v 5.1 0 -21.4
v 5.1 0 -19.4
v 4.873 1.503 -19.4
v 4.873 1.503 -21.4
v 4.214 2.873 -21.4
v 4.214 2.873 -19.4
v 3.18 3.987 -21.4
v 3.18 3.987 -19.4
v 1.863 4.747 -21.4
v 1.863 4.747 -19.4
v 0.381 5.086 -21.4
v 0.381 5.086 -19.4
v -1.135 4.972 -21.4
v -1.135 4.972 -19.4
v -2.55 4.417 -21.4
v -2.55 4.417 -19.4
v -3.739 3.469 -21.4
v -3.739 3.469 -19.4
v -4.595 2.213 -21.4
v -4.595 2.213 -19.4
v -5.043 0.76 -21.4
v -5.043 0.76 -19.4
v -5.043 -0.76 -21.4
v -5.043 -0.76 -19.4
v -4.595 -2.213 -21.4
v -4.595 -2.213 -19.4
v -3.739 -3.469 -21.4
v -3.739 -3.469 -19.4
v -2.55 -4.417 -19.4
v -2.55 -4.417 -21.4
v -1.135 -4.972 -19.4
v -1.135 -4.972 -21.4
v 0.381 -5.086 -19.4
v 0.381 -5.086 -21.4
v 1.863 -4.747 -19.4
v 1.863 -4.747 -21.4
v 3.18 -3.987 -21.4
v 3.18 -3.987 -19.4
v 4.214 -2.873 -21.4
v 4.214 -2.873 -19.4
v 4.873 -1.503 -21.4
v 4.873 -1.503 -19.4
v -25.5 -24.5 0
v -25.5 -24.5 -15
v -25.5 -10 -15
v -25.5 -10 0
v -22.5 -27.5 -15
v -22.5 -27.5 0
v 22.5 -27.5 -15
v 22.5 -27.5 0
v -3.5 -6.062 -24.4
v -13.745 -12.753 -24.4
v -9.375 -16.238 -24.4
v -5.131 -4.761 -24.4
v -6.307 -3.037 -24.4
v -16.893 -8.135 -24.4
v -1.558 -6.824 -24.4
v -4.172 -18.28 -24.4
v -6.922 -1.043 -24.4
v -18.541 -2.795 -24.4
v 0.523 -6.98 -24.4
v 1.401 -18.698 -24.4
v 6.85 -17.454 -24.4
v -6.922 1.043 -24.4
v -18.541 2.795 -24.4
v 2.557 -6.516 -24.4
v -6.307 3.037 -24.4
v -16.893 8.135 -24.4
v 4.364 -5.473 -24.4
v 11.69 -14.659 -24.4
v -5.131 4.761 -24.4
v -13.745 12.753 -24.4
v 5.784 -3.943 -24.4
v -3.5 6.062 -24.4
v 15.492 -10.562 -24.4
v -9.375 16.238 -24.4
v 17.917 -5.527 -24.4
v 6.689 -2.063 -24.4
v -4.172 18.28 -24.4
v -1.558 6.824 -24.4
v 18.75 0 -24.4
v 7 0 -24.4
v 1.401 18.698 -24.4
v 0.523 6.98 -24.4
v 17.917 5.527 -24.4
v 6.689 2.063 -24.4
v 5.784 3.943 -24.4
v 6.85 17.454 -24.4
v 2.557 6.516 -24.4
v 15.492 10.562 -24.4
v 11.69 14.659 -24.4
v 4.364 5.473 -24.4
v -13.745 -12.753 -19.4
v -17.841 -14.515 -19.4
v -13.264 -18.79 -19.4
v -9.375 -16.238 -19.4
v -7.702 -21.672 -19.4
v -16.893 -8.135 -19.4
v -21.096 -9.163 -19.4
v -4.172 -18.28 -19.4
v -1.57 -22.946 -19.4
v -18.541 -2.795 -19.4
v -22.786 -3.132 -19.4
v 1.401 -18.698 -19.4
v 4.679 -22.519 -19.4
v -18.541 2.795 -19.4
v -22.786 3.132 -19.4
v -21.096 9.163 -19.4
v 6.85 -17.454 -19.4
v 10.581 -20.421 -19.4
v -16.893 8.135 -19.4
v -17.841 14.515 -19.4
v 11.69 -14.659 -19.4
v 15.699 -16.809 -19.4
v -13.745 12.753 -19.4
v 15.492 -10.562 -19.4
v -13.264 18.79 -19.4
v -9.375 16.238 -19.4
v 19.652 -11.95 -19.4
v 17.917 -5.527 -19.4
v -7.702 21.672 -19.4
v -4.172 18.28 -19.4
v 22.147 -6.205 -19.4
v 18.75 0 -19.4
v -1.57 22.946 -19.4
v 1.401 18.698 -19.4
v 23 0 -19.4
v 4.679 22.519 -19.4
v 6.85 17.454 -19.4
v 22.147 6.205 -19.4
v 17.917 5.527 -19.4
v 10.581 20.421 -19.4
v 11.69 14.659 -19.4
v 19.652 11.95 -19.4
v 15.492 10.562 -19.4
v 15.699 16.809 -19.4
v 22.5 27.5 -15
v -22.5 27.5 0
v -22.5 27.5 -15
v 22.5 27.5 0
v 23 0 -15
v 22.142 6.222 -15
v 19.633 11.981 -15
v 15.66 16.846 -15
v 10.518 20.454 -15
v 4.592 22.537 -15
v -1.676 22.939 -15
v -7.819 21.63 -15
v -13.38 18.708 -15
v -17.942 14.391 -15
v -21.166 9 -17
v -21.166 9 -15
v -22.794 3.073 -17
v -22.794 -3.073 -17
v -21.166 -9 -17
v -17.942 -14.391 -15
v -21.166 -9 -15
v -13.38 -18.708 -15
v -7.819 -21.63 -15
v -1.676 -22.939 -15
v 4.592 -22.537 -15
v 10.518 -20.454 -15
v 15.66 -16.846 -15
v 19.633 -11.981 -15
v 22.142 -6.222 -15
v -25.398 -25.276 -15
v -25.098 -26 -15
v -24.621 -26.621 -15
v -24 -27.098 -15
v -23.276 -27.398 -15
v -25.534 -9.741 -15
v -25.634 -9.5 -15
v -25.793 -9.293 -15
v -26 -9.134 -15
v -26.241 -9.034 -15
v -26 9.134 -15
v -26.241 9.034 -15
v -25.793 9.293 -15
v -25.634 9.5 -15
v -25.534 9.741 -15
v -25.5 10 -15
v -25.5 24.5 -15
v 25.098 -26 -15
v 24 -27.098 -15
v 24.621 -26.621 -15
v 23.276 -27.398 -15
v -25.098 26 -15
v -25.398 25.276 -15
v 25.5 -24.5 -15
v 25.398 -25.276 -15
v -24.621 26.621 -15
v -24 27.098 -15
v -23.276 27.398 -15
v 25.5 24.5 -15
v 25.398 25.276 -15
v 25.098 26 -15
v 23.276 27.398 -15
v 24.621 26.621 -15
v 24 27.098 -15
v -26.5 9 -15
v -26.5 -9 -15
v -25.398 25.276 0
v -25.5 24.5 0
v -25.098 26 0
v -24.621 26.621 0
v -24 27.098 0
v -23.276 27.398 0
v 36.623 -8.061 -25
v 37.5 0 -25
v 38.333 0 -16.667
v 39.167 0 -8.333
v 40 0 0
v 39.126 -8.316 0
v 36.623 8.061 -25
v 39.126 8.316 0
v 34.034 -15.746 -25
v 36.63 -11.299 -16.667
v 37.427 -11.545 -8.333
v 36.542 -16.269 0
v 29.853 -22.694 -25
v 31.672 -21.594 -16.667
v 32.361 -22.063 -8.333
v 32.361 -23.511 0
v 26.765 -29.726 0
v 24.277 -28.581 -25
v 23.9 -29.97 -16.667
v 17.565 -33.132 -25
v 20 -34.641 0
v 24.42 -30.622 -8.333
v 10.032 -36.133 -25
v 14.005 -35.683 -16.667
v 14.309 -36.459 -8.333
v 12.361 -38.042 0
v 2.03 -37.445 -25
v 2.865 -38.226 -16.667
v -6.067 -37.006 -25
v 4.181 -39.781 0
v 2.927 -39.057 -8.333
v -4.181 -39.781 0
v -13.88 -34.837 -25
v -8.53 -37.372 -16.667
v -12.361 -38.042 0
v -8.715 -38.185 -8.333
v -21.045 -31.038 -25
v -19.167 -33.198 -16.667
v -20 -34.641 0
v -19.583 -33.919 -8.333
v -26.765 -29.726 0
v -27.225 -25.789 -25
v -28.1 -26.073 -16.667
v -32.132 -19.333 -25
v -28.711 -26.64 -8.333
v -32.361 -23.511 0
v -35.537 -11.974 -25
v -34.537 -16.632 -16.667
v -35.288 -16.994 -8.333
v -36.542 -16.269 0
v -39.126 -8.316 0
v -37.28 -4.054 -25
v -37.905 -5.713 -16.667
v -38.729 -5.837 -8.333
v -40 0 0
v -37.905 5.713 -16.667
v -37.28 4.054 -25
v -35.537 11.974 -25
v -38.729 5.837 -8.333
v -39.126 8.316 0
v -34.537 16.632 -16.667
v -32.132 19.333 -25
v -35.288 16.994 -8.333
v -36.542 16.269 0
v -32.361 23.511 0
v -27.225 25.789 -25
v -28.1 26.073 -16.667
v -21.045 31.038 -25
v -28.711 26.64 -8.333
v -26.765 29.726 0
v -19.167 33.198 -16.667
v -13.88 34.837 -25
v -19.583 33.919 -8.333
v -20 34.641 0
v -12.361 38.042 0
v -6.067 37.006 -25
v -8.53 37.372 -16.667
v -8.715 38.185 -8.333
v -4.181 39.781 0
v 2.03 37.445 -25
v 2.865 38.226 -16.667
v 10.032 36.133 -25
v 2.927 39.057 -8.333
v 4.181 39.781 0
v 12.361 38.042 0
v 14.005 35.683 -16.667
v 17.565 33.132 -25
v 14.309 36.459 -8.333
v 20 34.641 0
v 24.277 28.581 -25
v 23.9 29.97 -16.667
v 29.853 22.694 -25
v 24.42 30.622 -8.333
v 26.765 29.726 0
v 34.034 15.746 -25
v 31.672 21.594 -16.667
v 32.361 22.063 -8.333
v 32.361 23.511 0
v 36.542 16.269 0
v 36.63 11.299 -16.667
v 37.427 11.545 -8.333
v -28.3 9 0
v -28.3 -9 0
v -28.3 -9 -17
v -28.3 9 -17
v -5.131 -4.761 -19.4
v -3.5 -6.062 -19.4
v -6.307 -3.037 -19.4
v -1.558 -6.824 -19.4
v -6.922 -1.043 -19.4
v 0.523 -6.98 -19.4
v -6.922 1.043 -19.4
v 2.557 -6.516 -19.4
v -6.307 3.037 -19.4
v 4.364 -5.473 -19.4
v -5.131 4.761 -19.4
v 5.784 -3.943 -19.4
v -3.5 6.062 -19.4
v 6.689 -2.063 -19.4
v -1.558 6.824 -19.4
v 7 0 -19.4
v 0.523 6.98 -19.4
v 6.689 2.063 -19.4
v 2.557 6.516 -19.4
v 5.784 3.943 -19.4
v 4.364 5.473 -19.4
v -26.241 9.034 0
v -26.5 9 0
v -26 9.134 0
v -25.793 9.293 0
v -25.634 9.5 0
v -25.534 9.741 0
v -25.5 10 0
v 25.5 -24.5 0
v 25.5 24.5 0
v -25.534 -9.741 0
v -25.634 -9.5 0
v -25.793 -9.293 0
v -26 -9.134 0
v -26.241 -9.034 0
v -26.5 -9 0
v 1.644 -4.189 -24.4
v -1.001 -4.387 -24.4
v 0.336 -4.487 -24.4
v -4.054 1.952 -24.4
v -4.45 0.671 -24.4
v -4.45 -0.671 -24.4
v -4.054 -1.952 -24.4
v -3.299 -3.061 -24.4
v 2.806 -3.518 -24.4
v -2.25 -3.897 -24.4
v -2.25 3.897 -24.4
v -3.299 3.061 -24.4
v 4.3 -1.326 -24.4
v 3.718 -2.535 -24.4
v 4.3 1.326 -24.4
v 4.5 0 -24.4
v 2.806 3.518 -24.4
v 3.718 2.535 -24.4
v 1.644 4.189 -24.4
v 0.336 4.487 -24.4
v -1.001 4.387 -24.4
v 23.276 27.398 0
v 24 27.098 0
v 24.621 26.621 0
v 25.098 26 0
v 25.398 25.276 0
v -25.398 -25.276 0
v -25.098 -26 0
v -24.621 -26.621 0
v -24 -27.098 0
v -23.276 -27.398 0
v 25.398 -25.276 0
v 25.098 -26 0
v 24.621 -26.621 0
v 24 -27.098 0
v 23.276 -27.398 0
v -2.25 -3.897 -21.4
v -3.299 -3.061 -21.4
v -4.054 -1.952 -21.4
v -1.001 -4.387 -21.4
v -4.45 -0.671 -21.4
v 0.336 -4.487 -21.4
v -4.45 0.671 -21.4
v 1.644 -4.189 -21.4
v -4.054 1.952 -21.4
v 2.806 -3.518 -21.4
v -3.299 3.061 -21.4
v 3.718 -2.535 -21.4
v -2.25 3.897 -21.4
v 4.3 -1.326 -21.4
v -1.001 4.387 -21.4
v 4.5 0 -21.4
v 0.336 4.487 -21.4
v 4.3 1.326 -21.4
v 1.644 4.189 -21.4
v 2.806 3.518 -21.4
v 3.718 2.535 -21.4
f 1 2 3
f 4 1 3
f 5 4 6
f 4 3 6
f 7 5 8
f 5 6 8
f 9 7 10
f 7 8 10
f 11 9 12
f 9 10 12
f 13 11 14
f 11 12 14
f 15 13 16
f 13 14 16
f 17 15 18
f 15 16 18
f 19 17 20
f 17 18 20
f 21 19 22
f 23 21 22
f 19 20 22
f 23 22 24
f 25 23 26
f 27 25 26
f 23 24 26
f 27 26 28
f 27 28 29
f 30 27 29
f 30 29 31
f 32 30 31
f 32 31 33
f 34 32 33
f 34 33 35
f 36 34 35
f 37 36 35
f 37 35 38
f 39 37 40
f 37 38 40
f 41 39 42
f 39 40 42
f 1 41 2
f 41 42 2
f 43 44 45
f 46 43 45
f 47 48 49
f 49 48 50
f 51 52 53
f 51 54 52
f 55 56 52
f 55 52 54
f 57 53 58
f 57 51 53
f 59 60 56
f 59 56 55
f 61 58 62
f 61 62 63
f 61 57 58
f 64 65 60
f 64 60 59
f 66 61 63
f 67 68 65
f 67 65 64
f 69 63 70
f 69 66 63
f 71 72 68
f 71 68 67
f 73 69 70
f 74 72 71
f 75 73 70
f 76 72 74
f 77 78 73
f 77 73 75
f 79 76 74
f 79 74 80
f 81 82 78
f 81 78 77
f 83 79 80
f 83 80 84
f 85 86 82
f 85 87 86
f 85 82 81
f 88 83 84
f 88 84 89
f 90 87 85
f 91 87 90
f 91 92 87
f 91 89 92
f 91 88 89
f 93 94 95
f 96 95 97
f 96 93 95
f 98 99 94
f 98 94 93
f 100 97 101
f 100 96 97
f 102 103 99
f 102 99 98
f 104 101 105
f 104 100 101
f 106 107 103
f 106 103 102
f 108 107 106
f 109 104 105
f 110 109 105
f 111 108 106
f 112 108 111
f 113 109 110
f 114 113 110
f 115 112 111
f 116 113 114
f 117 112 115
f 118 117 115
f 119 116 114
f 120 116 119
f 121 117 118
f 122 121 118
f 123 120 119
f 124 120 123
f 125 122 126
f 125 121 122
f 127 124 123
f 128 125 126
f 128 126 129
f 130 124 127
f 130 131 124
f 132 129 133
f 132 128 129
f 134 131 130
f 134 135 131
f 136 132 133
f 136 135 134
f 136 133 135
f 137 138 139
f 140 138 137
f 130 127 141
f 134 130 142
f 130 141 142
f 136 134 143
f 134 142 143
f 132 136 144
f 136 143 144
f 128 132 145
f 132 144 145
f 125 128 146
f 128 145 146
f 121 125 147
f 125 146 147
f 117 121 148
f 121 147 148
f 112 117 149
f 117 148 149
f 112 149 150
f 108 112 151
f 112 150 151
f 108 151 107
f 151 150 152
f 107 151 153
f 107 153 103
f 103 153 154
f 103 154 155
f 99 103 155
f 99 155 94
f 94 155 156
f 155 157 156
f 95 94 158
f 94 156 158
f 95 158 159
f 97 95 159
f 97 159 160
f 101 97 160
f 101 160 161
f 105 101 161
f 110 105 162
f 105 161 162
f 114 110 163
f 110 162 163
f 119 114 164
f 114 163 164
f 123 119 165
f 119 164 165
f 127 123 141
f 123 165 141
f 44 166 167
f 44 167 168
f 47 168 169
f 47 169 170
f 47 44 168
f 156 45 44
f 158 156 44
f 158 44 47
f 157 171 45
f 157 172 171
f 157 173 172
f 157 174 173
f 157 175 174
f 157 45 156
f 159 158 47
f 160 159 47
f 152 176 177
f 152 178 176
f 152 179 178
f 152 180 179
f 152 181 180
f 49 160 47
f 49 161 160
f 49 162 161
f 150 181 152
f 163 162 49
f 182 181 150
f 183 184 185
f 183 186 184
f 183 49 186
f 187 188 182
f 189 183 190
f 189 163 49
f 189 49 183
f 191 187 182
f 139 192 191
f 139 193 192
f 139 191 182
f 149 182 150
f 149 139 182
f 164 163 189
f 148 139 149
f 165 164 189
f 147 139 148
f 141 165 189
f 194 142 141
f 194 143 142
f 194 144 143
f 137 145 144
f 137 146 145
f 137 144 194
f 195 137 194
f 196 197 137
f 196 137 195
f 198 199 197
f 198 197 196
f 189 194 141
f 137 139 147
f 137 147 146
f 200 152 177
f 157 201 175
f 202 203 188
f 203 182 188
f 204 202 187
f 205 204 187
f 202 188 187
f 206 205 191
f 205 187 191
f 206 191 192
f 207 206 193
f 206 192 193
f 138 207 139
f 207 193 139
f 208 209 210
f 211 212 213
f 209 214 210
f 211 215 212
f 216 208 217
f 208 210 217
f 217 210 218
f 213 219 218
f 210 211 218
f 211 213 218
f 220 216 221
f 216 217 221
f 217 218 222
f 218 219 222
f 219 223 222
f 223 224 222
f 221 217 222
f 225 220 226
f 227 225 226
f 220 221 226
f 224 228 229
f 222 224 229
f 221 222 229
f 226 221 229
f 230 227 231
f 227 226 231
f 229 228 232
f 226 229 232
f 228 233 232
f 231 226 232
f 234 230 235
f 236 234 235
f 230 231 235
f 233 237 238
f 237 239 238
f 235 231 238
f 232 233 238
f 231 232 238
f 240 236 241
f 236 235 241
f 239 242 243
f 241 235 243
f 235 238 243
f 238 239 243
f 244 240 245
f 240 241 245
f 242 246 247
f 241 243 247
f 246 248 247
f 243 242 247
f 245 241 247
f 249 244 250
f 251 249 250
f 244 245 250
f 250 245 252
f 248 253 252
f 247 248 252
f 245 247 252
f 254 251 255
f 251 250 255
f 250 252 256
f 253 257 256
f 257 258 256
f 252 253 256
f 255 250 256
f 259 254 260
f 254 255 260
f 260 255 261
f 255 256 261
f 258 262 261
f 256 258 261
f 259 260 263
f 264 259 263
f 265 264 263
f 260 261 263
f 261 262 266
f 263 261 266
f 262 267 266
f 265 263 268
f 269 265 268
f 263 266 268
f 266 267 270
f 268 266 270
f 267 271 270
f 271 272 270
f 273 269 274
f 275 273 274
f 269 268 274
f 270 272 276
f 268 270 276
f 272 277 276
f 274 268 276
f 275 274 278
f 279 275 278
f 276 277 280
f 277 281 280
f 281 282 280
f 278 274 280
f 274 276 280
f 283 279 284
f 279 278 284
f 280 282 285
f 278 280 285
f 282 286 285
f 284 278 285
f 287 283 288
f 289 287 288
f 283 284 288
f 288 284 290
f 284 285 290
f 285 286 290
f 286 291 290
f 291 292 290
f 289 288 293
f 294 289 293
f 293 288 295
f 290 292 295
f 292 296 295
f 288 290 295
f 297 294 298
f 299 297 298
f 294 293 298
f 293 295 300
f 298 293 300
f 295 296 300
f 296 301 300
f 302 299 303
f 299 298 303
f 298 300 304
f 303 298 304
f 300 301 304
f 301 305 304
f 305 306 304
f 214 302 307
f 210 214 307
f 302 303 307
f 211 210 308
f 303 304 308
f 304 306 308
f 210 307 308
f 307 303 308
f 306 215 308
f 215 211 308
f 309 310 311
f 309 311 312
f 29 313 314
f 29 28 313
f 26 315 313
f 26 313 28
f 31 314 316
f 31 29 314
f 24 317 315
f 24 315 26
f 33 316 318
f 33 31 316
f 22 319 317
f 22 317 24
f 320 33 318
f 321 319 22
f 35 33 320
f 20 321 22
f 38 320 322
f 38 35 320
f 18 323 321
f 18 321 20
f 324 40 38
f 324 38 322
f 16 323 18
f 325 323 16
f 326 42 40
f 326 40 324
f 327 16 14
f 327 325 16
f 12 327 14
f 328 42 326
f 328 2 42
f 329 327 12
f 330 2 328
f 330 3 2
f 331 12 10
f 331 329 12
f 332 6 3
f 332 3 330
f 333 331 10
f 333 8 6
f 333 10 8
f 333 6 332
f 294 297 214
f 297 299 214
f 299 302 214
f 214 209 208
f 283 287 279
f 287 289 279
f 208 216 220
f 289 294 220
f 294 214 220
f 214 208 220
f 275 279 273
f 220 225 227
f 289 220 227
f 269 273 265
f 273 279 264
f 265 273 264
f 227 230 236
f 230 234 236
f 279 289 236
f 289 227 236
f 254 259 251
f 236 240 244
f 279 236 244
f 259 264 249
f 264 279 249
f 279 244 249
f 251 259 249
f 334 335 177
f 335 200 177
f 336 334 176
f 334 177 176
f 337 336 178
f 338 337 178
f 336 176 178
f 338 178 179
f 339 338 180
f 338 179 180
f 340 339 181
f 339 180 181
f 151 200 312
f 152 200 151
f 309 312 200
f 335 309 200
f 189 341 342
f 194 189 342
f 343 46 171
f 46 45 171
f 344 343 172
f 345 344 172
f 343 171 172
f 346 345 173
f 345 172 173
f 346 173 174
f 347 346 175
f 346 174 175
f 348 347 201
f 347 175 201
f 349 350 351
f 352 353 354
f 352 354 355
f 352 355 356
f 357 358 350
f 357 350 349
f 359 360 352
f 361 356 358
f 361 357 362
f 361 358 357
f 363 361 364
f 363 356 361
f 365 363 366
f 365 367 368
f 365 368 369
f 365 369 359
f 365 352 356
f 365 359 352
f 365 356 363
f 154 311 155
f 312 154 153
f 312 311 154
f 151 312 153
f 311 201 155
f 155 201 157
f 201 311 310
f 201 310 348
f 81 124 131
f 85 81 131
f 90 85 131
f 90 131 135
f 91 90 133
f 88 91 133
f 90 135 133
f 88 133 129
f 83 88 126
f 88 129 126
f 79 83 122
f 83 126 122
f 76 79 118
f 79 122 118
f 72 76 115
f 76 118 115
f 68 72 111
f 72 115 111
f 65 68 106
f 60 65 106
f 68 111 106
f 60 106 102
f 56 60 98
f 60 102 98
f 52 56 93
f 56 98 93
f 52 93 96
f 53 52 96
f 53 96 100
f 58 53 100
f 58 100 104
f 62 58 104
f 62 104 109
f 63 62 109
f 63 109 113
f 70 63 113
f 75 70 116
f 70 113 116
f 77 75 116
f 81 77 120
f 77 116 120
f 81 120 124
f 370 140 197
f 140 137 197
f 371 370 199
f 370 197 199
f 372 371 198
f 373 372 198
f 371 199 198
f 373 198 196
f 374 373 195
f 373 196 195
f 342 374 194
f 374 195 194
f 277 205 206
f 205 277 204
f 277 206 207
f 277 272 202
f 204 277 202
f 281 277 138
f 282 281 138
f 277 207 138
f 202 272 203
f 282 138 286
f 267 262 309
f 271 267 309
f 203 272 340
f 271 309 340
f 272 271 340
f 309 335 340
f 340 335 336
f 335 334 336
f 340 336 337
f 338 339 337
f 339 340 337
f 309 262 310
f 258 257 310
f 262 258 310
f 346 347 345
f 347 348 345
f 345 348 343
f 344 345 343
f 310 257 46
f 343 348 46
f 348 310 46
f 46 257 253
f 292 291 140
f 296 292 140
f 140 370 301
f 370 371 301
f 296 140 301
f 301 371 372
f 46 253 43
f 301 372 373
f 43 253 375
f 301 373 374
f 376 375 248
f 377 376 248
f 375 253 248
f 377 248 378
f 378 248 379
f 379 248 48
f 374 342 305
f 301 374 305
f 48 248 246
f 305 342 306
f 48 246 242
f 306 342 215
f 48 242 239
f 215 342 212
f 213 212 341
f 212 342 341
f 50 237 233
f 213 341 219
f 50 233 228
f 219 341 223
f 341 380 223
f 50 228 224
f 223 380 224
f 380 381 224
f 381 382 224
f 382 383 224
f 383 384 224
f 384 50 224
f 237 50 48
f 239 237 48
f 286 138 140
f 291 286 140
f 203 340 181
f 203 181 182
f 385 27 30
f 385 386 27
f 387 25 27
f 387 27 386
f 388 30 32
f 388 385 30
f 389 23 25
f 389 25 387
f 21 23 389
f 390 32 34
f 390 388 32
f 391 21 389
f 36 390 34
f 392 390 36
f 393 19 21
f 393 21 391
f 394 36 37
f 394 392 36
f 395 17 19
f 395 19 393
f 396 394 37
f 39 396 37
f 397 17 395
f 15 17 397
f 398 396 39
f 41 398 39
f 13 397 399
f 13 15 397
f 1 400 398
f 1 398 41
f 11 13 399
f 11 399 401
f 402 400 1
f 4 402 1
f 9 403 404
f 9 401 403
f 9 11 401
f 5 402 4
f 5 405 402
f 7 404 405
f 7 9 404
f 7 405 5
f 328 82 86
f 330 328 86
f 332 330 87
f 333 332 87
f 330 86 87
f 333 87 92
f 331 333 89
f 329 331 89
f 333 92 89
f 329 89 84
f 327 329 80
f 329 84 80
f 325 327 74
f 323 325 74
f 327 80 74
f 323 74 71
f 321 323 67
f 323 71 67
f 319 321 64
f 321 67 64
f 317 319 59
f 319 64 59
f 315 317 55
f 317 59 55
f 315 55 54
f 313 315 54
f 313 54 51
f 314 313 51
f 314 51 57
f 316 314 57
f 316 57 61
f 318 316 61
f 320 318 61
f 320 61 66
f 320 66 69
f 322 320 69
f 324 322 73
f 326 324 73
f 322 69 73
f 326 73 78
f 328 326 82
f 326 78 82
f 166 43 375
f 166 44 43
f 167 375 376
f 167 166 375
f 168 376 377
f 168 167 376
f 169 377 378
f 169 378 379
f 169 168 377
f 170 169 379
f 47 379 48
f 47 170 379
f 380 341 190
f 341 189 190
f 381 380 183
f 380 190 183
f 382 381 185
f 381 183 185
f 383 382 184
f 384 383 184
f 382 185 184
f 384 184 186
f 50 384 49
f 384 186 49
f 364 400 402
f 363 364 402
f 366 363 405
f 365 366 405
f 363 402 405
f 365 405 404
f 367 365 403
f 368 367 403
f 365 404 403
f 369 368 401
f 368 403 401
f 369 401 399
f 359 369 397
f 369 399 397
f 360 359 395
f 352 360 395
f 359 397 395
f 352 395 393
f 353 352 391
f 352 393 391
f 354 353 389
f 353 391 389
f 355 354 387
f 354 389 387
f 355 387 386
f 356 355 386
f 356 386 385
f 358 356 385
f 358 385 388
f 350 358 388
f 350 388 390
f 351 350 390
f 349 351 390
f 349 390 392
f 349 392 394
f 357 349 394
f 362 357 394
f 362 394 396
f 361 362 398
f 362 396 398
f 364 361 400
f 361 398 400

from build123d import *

# Parameters (mm, degrees)
SKETCH4_W           = 51
SKETCH4_H           = 55
CUT_EXTRUDE1_DEPTH  = 15
FILLET1_R           = 3
SKETCH7_W           = 10
SKETCH7_H           = 18
CUT_EXTRUDE5_DEPTH  = 17
SKETCH8_R           = 23
CUT_EXTRUDE6_DEPTH  = 4.4
SKETCH10_R          = 18.75
CUT_EXTRUDE7_DEPTH  = 5
SKETCH11_R          = 7
BOSS_EXTRUDE3_DEPTH = 5
SKETCH12_R          = 5.1
CUT_EXTRUDE8_DEPTH  = 2
SKETCH13_R          = 4.5
CUT_EXTRUDE9_DEPTH  = 3
FILLET2_R           = 1


with BuildPart() as part:
    # Sketch2 → Revolve1 (revolve)
    with BuildSketch(Plane(origin=(0, 0, 0), x_dir=(1, 0, 0), z_dir=(0, 1, 0))):
        Polygon((0, 25), (37.5, 25), (40, 0), (0, 0), align=None)
    revolve(axis=Axis((0, 0, 0), (0, 0, -1)))

    # Sketch4 → Cut-Extrude1 (cut)
    with BuildSketch(Plane.XY):
        Rectangle(SKETCH4_W, SKETCH4_H)
    extrude(amount=-CUT_EXTRUDE1_DEPTH, mode=Mode.SUBTRACT)

    # Fillet1
    fillet1_edges = [part.edges().sort_by_distance(p)[0] for p in [
        (25.5, 27.5, -7.5),
        (25.5, -27.5, -7.5),
        (-25.5, -27.5, -7.5),
        (-25.5, 27.5, -7.5),
    ]]
    fillet(fillet1_edges, radius=FILLET1_R)

    # Sketch7 → Cut-Extrude5 (cut)
    with BuildSketch(Plane.XY):
        with Locations((-23.3, 0)):
            Rectangle(SKETCH7_W, SKETCH7_H)
    extrude(amount=-CUT_EXTRUDE5_DEPTH, mode=Mode.SUBTRACT)

    # Sketch8 → Cut-Extrude6 (cut)
    with BuildSketch(Plane.XY.offset(-15)):
        Circle(SKETCH8_R)
    extrude(amount=-CUT_EXTRUDE6_DEPTH, mode=Mode.SUBTRACT)

    # Sketch10 → Cut-Extrude7 (cut)
    with BuildSketch(Plane.XY.offset(-19.4)):
        Circle(SKETCH10_R)
    extrude(amount=-CUT_EXTRUDE7_DEPTH, mode=Mode.SUBTRACT)

    # Sketch11 → Boss-Extrude3 (add)
    with BuildSketch(Plane.XY.offset(-24.4)):
        Circle(SKETCH11_R)
    extrude(amount=BOSS_EXTRUDE3_DEPTH)

    # Sketch12 → Cut-Extrude8 (cut)
    with BuildSketch(Plane.XY.offset(-19.4)):
        Circle(SKETCH12_R)
    extrude(amount=-CUT_EXTRUDE8_DEPTH, mode=Mode.SUBTRACT)

    # Sketch13 → Cut-Extrude9 (cut)
    with BuildSketch(Plane.XY.offset(-21.4)):
        Circle(SKETCH13_R)
    extrude(amount=-CUT_EXTRUDE9_DEPTH, mode=Mode.SUBTRACT)

    # Fillet2
    fillet2_edges = [part.edges().sort_by_distance(p)[0] for p in [
        (-25.5, 9, -7.5),
        (-25.5, -9, -7.5),
    ]]
    fillet(fillet2_edges, radius=FILLET2_R)


solid = part.part
